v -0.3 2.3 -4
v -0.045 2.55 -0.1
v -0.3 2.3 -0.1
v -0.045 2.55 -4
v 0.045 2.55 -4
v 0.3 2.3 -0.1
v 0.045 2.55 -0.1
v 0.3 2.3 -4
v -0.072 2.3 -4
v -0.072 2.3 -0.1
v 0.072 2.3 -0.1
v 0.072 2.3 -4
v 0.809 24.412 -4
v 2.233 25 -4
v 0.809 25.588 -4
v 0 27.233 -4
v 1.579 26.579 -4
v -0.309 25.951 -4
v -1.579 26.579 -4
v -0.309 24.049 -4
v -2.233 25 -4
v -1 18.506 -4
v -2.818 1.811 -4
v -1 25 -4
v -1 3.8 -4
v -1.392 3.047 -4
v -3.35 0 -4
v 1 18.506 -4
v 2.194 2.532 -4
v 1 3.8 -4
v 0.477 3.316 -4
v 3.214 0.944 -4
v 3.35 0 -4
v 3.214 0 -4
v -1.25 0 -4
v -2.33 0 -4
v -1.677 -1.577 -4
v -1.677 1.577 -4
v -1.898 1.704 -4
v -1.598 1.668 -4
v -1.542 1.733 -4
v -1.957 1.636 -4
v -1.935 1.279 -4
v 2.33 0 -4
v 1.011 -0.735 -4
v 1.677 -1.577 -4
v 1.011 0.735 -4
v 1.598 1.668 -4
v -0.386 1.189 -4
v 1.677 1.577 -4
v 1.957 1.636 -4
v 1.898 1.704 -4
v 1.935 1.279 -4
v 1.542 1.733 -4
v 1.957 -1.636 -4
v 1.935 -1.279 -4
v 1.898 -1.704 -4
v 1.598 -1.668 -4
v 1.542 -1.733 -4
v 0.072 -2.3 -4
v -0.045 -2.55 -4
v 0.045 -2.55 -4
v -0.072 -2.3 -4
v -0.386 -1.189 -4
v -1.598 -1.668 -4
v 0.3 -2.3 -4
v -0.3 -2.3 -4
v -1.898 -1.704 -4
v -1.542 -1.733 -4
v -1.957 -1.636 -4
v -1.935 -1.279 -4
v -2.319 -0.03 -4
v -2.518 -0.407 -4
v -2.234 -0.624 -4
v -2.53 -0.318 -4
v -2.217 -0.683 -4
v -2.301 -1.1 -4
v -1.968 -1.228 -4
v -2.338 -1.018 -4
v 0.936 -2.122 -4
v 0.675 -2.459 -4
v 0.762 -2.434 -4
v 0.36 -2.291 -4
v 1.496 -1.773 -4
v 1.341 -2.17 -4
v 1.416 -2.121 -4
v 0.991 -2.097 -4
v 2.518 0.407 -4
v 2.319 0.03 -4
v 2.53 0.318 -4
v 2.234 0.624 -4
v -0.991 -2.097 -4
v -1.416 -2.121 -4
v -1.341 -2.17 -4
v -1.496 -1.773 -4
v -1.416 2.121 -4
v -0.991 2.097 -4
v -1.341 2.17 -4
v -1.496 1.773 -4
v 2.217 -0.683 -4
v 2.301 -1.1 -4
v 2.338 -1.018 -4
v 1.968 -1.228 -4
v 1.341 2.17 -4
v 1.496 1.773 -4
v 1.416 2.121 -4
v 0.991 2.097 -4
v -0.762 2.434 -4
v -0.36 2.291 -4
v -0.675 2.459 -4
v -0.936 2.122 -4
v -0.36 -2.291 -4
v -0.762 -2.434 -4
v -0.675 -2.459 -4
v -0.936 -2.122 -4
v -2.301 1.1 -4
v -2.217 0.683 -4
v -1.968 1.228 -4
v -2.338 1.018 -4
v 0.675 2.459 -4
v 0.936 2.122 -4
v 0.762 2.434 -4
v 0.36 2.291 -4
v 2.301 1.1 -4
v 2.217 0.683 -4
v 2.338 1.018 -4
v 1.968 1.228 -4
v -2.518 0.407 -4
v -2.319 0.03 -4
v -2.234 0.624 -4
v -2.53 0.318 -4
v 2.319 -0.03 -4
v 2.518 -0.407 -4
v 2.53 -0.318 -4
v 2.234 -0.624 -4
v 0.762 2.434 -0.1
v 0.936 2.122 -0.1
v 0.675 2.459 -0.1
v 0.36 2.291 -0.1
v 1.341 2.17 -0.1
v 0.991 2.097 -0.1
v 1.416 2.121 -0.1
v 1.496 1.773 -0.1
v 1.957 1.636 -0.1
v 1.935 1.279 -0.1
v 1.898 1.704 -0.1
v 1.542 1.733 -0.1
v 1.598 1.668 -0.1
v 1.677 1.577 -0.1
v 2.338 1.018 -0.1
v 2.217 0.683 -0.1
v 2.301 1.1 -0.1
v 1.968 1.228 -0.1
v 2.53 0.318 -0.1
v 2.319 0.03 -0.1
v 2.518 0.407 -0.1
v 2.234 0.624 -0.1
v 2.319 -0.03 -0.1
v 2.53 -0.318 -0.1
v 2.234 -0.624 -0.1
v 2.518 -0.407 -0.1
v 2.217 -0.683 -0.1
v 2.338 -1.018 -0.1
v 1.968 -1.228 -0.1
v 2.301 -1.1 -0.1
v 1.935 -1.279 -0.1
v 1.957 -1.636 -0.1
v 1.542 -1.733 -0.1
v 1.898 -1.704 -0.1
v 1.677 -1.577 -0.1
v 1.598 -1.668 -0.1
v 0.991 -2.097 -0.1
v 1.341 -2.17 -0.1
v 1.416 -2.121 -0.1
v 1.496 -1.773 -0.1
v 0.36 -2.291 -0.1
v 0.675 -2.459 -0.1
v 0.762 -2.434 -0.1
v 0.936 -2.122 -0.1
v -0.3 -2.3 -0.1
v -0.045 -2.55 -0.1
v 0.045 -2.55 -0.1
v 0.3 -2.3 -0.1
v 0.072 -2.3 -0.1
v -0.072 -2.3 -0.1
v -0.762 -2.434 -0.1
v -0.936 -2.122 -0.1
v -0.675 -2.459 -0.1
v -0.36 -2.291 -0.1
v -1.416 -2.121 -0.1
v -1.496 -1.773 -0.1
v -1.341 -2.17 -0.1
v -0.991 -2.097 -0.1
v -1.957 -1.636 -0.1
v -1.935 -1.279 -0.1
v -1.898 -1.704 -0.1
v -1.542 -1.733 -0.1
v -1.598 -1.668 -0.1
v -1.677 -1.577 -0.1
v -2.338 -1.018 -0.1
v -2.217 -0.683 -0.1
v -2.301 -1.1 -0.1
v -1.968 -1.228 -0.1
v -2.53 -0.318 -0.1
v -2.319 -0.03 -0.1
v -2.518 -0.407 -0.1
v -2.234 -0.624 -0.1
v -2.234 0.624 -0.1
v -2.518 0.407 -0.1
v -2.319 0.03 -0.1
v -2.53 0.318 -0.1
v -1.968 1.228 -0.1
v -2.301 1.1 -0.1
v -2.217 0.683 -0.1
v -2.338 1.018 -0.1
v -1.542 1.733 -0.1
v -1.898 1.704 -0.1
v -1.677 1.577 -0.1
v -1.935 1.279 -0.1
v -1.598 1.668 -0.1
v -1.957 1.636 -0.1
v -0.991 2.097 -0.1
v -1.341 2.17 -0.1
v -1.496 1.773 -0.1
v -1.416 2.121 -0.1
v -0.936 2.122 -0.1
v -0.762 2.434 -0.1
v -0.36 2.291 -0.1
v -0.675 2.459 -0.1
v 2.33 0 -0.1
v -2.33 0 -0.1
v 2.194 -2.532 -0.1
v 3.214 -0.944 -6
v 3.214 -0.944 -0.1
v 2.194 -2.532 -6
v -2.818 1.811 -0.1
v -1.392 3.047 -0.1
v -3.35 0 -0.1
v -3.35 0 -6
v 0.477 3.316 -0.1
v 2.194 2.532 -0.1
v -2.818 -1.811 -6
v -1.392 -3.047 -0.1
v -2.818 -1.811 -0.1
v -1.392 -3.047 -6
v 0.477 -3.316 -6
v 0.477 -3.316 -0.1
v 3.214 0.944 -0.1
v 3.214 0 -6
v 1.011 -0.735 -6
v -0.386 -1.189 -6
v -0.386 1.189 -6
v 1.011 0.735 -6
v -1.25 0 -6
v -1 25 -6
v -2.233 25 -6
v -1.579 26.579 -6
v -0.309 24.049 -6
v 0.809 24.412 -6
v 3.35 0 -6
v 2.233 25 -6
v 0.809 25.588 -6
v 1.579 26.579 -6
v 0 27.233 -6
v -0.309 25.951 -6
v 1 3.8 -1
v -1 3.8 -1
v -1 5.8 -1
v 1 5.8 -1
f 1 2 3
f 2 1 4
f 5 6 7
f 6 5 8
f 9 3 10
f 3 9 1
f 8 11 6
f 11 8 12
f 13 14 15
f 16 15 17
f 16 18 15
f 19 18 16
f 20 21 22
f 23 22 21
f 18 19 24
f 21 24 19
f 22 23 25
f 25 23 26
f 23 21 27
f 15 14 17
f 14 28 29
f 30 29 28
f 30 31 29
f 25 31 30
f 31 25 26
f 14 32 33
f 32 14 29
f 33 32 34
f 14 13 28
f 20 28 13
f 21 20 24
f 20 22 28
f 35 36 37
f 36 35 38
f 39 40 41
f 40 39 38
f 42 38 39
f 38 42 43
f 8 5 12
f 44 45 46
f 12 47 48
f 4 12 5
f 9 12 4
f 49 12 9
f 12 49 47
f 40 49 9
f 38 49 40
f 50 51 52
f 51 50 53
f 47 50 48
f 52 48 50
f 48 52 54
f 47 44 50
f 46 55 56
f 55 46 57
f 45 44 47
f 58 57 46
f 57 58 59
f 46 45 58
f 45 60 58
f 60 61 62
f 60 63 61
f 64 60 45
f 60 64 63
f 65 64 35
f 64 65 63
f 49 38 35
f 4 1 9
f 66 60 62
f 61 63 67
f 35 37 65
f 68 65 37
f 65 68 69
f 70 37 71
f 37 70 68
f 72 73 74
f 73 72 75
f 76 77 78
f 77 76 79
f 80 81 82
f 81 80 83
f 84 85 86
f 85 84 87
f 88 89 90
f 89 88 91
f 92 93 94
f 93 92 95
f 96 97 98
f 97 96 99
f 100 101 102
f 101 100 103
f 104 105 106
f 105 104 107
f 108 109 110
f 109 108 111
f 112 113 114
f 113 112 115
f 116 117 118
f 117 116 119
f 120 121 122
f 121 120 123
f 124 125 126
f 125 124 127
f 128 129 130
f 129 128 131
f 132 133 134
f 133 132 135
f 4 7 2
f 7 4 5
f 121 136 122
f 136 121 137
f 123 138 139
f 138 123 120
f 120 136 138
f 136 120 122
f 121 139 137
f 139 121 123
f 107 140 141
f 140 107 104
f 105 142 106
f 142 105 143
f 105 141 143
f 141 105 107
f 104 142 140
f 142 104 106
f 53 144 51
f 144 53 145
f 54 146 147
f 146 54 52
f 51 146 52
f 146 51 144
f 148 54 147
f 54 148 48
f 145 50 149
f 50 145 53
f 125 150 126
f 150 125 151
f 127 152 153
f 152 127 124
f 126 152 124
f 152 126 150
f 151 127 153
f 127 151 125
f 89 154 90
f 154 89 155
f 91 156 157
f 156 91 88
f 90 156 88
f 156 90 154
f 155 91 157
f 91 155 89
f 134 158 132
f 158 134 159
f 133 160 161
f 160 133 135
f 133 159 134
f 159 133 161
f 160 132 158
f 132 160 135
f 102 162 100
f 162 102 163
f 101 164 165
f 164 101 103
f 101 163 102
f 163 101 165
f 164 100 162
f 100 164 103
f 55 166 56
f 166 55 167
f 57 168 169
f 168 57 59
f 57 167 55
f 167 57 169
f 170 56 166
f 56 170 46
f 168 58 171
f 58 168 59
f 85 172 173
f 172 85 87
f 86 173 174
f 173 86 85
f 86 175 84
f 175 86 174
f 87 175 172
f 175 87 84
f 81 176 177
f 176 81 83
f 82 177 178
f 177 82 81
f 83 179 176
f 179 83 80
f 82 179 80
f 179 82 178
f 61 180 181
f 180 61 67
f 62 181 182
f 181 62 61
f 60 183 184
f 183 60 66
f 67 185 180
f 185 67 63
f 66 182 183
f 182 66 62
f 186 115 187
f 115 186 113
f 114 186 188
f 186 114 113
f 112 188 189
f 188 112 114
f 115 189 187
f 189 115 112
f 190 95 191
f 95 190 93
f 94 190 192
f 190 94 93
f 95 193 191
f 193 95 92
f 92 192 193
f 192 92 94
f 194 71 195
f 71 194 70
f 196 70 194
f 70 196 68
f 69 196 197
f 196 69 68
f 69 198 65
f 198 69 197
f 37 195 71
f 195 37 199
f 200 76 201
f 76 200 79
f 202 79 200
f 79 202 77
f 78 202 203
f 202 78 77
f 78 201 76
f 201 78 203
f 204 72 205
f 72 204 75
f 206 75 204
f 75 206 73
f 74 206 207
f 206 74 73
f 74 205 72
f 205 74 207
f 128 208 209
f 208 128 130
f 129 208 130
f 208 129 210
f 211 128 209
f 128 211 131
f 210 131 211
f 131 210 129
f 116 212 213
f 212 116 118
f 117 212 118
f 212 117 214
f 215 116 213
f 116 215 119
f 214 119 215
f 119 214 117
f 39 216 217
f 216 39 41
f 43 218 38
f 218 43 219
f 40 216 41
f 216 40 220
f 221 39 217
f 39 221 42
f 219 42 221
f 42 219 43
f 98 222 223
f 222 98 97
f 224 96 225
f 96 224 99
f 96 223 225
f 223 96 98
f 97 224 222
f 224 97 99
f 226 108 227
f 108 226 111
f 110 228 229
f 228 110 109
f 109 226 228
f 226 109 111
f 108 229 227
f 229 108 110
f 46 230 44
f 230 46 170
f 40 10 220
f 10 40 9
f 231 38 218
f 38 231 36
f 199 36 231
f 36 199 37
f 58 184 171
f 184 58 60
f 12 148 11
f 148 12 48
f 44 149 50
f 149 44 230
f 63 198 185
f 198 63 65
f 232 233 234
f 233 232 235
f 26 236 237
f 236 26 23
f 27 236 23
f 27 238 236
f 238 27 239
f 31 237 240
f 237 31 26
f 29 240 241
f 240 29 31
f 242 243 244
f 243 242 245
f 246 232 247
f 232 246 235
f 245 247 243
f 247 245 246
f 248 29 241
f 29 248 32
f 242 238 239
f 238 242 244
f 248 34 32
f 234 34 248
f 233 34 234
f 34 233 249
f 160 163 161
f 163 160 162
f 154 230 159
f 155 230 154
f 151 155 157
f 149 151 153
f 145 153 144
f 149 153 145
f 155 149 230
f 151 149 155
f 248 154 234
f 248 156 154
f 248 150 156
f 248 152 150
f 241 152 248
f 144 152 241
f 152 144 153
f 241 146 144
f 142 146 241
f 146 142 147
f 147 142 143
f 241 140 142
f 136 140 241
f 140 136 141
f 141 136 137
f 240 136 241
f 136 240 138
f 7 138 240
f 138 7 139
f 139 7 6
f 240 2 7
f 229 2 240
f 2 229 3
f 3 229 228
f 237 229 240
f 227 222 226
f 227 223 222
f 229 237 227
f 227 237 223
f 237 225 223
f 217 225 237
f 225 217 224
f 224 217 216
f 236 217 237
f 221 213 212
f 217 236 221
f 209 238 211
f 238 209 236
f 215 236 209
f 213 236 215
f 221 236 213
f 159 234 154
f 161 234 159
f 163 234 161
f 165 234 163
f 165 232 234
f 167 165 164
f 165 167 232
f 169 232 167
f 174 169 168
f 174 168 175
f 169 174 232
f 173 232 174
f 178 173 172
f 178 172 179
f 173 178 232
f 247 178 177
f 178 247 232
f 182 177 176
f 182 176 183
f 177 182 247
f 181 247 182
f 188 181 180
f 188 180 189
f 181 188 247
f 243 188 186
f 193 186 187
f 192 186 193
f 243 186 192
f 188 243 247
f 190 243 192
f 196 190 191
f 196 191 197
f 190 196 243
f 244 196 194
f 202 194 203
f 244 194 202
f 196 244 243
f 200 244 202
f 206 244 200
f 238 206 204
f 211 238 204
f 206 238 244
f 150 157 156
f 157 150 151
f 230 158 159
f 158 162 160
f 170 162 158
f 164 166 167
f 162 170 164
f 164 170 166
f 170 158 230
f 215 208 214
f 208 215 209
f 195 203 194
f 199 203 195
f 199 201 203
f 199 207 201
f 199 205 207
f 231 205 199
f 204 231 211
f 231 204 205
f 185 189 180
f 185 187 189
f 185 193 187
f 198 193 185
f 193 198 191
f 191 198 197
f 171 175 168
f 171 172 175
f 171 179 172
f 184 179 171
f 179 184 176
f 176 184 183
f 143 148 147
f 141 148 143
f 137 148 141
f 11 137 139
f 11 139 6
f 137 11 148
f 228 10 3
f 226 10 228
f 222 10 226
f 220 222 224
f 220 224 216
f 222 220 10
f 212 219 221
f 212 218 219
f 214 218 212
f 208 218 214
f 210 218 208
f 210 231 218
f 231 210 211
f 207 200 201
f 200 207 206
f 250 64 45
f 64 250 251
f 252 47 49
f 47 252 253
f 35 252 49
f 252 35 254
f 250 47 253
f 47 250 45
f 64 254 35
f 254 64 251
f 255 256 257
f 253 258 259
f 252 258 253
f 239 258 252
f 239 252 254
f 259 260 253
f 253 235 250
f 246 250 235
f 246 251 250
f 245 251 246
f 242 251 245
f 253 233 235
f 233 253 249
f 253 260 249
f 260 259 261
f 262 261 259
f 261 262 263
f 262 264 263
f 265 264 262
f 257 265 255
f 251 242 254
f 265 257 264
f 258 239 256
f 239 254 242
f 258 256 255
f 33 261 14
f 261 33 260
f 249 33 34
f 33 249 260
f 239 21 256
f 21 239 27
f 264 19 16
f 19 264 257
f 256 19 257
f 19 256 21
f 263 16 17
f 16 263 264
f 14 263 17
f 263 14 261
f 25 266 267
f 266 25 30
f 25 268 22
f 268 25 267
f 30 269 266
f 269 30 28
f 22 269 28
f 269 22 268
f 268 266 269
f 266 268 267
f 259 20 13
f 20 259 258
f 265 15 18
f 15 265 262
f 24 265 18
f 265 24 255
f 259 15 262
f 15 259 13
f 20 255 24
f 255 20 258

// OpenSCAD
/**
 *  Parametric servo arm generator for OpenScad
 *  G�n�rateur de palonnier de servo pour OpenScad
 *
 *  Copyright (c) 2012 Charles Rincheval.  All rights reserved.
 *
 *  Modified to add support for 2F size 2015 Paul Barrett.
 *  Modified to add support for 1F size 2016 Paul Barrett.
 *
 *  This library is free software; you can redistribute it and/or
 *  modify it under the terms of the GNU Lesser General Public
 *  License as published by the Free Software Foundation; either
 *  version 2.1 of the License, or (at your option) any later version.
 *
 *  This library is distributed in the hope that it will be useful,
 *  but WITHOUT ANY WARRANTY; without even the implied warranty of
 *  MERCHANTABILITY or FITNESS FOR A PARTICULAR PURPOSE.  See the GNU
 *  Lesser General Public License for more details.
 *
 *  You should have received a copy of the GNU Lesser General Public
 *  License along with this library; if not, write to the Free Software
 *  Foundation, Inc., 51 Franklin St, Fifth Floor, Boston, MA  02110-1301  USA
 *
 *  Last update :
 *  https://github.com/hugokernel/OpenSCAD_ServoArms
 *
 *  http://www.digitalspirit.org/
 */

//$fn = 40;

// in mm.
arm_length = 25;

arm_count = 1;

// Clear between arm head and servo head. With PLA material, use clear : 0.3, for ABS, use 0.2
SERVO_HEAD_CLEAR = 0.3;

// Servo hub size
hub_type = 2; // [3:3F-25T, 2:2F-22T, 1:1F-15T]

taper_amount = 3; // [3:Full, 2.5:Medium, 2:None]

/**
 *  Head / Tooth parameters
 *  Futaba 3F Standard Spline
 *  http://www.servocity.com/html/futaba_servo_splines.html
 *
 *  First array (head related) :
 *  0. Head external diameter
 *  1. Head heigth
 *  2. Head thickness
 *  3. Head screw diameter
 *
 *  Second array (tooth related) :
 *  0. Tooth count
 *  1. Tooth height
 *  2. Tooth length
 *  3. Tooth width
 */
FUTABA_3F_SPLINE = [
    [5.92, 4, 1.1, 2.5],
    [25, 0.3, 0.7, 0.1]
];
FUTABA_2F_SPLINE = [
    [4.5, 4, 1.1, 2.5],
    [22, 0.25, 0.6, 0.09]
];
FUTABA_1F_SPLINE = [
    [4.0, 3.75, 1.1, 2.4],
    [15, 0.25, 0.6, 0.09]
];

module servo_futaba_3f(length, count) {
    servo_arm(FUTABA_3F_SPLINE, [length, count]);
}
module servo_futaba_2f(length, count) {
    servo_arm(FUTABA_2F_SPLINE, [length, count]);
}
module servo_futaba_1f(length, count) {
    servo_arm(FUTABA_1F_SPLINE, [length, count]);
}

/**
 *  If you want to support a new servo, juste add a new spline definition array
 *  and a module named like servo_XXX_YYY where XXX is servo brand and YYY is the
 *  connection type (3f) or the servo type (s3003)
 */

module servo_standard(length, count) {
      if (hub_type == 1)
          servo_futaba_1f(length, count);
      else if (hub_type == 2)
          servo_futaba_2f(length, count);
		else
          servo_futaba_3f(length, count);
}

/**
 *  Tooth
 *
 *    |<-w->|
 *    |_____|___
 *    /     \  ^h
 *  _/       \_v
 *   |<--l-->|
 *
 *  - tooth length (l)
 *  - tooth width (w)
 *  - tooth height (h)
 *  - height
 *
 */
module servo_head_tooth(length, width, height, head_height) {
    linear_extrude(height = head_height) {
        polygon([[-length / 2, 0], [-width / 2, height], [width / 2, height], [length / 2,0]]);
    }
}

/**
 *  Servo head
 */
module servo_head(params, clear = SERVO_HEAD_CLEAR) {

    head = params[0];
    tooth = params[1];

    head_diameter = head[0];
    head_heigth = head[1];

    tooth_count = tooth[0];
    tooth_height = tooth[1];
    tooth_length = tooth[2];
    tooth_width = tooth[3];

    % cylinder(r = head_diameter / 2, h = head_heigth + 1);

    cylinder(r = head_diameter / 2 - tooth_height + 0.03 + clear, h = head_heigth);

    for (i = [0 : tooth_count]) {
        rotate([0, 0, i * (360 / tooth_count)]) {
            translate([0, head_diameter / 2 - tooth_height + clear, 0]) {
                servo_head_tooth(tooth_length, tooth_width, tooth_height, head_heigth);
            }
        }
    }
}

/**
 *  Servo hold
 *  - Head / Tooth parameters
 *  - Arms params (length and count)
 */
module servo_arm(params, arms) {

    head = params[0];
    tooth = params[1];

    head_diameter = head[0];
    head_heigth = head[1];
    head_thickness = head[2];
    head_screw_diameter = head[3];

    tooth_length = tooth[2];
    tooth_width = tooth[3];

    arm_length = arms[0];
    arm_count = arms[1];

    /**
     *  Servo arm
     *  - length is from center to last hole
     */
    module arm(tooth_length, tooth_width, head_height, head_heigth, hole_count = 1) {

        arm_screw_diameter = 2;

        difference() {
            union() {
                cylinder(r = tooth_width / 2, h = head_heigth);

                linear_extrude(height = head_heigth) {
                    polygon([
                        [-tooth_width / 2, 0], [-tooth_width / taper_amount, tooth_length],
                        [tooth_width / taper_amount, tooth_length], [tooth_width / 2, 0]
                    ]);
                }

                translate([0, tooth_length, 0]) {
                    cylinder(r = tooth_width / taper_amount, h = head_heigth);
                }

                if (tooth_length >= 12) {
                    translate([-head_heigth / 2 + 2, 3.8, -4]) {
                        rotate([90, 0, 0]) {
                            rotate([0, -90, 0]) {
                                linear_extrude(height = head_heigth) {
                                    polygon([
                                        [-tooth_length / 1.7, 4], [0, 4], [0, - head_height + 5],
                                        [-2, - head_height + 5]
                                    ]);
                                }
                            }
                        }
                    }
                }
            }

            // Hole
            for (i = [0 : hole_count - 1]) {
                //translate([0, length - (length / hole_count * i), -1]) {
                translate([0, tooth_length - (4 * i), -1]) {
                    cylinder(r = arm_screw_diameter / 2, h = 10);
                }
            }

            cylinder(r = head_screw_diameter / 2, h = 10);
        }
    }

    difference() {
        translate([0, 0, 0.1]) {
            cylinder(r = head_diameter / 2 + head_thickness, h = head_heigth + 1);
        }

        cylinder(r = head_screw_diameter / 2, h = 10);

        servo_head(params);
    }

    arm_thickness = head_thickness;

    // Arm
    translate([0, 0, head_heigth]) {
        for (i = [0 : arm_count - 1]) {
            rotate([0, 0, i * (360 / arm_count)]) {
                arm(arm_length, head_diameter + arm_thickness * 2, head_heigth, 2);
            }
        }
    }
}

module demo() {
    rotate([0, 180, 0])
      servo_standard(arm_length, arm_count);
}

demo();

